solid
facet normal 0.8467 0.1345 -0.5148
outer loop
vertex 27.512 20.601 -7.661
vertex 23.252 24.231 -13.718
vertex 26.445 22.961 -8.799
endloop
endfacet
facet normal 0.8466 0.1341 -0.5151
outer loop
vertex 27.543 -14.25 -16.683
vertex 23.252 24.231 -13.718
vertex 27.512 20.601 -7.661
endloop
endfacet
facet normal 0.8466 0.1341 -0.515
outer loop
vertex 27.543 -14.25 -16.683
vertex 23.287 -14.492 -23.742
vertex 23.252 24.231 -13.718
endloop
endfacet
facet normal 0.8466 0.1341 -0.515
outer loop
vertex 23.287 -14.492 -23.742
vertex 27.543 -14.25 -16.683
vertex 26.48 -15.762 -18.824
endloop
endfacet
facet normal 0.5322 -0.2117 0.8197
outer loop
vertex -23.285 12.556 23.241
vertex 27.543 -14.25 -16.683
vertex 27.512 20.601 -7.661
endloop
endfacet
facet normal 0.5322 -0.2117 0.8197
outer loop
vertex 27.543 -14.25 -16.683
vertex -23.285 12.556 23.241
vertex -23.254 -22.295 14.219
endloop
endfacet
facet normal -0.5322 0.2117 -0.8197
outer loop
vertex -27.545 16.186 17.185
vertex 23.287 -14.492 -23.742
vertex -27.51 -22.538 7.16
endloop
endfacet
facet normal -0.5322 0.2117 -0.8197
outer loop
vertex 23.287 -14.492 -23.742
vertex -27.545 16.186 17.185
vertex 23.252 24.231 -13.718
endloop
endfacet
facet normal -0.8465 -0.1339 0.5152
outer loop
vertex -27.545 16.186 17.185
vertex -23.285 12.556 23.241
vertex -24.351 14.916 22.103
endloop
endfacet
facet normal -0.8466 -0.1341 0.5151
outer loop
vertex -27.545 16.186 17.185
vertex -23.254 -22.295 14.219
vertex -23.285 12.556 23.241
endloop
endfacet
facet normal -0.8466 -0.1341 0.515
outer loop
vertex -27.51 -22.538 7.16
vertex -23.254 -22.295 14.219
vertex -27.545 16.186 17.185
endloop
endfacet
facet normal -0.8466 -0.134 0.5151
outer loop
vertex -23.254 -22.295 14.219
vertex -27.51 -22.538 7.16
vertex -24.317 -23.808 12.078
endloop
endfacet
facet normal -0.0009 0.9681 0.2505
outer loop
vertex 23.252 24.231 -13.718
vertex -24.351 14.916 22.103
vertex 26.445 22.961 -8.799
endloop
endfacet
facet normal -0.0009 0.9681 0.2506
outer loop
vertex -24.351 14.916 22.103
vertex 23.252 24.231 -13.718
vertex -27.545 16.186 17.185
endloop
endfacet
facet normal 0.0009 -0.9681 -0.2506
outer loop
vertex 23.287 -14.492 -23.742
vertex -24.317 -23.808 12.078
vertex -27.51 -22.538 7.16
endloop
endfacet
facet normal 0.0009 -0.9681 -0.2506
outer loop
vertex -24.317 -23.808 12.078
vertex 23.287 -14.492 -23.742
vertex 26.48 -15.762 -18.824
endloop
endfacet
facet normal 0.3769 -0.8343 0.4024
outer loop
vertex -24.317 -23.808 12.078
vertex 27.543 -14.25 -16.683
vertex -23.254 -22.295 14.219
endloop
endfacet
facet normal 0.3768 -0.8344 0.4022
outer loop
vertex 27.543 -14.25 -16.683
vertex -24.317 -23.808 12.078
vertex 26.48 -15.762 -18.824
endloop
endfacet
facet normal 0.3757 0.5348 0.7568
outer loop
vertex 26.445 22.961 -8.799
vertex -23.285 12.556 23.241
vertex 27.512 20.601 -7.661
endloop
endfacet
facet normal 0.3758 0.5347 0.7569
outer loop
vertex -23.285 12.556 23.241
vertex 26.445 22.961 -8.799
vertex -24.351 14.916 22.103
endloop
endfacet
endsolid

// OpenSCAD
// file: chamfered_block.scad
// Hand-written ground truth. Coordinates: [0,L] x [0,W] x [0,H].
$fn = 64;
body_length = 60;
body_width = 40;
body_height = 8;
chamfer_1_width = 2;
chamfer_2_width = 2;

module chamfered_block(body_length=60, body_width=40, body_height=8,
                       chamfer_1_width=2, chamfer_2_width=2) {
    assert(min(body_length,body_width,body_height)>0);
    assert(min(chamfer_1_width,chamfer_2_width)>0);
    assert(max(chamfer_1_width,chamfer_2_width)<body_height);
    assert(chamfer_1_width+chamfer_2_width<body_width);
    module along_x() {
        multmatrix([[0,0,1,-1],[1,0,0,0],[0,1,0,0],[0,0,0,1]])
            linear_extrude(height=body_length+2) children();
    }
    difference() {
        cube([body_length,body_width,body_height]);
        along_x() polygon([[0,body_height],
            [chamfer_1_width,body_height],[0,body_height-chamfer_1_width]]);
        along_x() polygon([[body_width,body_height],
            [body_width-chamfer_2_width,body_height],
            [body_width,body_height-chamfer_2_width]]);
    }
}

chamfered_block(body_length,body_width,body_height,chamfer_1_width,chamfer_2_width);
// main file
use <chamfered_block.scad>
$fn = 16;
body_length = 60;
body_width = 40;
body_height = 8;
chamfer_1_width = 2;
chamfer_2_width = 2;

rotate([17,31,9]) translate([-body_length/2,-body_width/2,-body_height/2])
    chamfered_block(body_length,body_width,body_height,chamfer_1_width,chamfer_2_width);
